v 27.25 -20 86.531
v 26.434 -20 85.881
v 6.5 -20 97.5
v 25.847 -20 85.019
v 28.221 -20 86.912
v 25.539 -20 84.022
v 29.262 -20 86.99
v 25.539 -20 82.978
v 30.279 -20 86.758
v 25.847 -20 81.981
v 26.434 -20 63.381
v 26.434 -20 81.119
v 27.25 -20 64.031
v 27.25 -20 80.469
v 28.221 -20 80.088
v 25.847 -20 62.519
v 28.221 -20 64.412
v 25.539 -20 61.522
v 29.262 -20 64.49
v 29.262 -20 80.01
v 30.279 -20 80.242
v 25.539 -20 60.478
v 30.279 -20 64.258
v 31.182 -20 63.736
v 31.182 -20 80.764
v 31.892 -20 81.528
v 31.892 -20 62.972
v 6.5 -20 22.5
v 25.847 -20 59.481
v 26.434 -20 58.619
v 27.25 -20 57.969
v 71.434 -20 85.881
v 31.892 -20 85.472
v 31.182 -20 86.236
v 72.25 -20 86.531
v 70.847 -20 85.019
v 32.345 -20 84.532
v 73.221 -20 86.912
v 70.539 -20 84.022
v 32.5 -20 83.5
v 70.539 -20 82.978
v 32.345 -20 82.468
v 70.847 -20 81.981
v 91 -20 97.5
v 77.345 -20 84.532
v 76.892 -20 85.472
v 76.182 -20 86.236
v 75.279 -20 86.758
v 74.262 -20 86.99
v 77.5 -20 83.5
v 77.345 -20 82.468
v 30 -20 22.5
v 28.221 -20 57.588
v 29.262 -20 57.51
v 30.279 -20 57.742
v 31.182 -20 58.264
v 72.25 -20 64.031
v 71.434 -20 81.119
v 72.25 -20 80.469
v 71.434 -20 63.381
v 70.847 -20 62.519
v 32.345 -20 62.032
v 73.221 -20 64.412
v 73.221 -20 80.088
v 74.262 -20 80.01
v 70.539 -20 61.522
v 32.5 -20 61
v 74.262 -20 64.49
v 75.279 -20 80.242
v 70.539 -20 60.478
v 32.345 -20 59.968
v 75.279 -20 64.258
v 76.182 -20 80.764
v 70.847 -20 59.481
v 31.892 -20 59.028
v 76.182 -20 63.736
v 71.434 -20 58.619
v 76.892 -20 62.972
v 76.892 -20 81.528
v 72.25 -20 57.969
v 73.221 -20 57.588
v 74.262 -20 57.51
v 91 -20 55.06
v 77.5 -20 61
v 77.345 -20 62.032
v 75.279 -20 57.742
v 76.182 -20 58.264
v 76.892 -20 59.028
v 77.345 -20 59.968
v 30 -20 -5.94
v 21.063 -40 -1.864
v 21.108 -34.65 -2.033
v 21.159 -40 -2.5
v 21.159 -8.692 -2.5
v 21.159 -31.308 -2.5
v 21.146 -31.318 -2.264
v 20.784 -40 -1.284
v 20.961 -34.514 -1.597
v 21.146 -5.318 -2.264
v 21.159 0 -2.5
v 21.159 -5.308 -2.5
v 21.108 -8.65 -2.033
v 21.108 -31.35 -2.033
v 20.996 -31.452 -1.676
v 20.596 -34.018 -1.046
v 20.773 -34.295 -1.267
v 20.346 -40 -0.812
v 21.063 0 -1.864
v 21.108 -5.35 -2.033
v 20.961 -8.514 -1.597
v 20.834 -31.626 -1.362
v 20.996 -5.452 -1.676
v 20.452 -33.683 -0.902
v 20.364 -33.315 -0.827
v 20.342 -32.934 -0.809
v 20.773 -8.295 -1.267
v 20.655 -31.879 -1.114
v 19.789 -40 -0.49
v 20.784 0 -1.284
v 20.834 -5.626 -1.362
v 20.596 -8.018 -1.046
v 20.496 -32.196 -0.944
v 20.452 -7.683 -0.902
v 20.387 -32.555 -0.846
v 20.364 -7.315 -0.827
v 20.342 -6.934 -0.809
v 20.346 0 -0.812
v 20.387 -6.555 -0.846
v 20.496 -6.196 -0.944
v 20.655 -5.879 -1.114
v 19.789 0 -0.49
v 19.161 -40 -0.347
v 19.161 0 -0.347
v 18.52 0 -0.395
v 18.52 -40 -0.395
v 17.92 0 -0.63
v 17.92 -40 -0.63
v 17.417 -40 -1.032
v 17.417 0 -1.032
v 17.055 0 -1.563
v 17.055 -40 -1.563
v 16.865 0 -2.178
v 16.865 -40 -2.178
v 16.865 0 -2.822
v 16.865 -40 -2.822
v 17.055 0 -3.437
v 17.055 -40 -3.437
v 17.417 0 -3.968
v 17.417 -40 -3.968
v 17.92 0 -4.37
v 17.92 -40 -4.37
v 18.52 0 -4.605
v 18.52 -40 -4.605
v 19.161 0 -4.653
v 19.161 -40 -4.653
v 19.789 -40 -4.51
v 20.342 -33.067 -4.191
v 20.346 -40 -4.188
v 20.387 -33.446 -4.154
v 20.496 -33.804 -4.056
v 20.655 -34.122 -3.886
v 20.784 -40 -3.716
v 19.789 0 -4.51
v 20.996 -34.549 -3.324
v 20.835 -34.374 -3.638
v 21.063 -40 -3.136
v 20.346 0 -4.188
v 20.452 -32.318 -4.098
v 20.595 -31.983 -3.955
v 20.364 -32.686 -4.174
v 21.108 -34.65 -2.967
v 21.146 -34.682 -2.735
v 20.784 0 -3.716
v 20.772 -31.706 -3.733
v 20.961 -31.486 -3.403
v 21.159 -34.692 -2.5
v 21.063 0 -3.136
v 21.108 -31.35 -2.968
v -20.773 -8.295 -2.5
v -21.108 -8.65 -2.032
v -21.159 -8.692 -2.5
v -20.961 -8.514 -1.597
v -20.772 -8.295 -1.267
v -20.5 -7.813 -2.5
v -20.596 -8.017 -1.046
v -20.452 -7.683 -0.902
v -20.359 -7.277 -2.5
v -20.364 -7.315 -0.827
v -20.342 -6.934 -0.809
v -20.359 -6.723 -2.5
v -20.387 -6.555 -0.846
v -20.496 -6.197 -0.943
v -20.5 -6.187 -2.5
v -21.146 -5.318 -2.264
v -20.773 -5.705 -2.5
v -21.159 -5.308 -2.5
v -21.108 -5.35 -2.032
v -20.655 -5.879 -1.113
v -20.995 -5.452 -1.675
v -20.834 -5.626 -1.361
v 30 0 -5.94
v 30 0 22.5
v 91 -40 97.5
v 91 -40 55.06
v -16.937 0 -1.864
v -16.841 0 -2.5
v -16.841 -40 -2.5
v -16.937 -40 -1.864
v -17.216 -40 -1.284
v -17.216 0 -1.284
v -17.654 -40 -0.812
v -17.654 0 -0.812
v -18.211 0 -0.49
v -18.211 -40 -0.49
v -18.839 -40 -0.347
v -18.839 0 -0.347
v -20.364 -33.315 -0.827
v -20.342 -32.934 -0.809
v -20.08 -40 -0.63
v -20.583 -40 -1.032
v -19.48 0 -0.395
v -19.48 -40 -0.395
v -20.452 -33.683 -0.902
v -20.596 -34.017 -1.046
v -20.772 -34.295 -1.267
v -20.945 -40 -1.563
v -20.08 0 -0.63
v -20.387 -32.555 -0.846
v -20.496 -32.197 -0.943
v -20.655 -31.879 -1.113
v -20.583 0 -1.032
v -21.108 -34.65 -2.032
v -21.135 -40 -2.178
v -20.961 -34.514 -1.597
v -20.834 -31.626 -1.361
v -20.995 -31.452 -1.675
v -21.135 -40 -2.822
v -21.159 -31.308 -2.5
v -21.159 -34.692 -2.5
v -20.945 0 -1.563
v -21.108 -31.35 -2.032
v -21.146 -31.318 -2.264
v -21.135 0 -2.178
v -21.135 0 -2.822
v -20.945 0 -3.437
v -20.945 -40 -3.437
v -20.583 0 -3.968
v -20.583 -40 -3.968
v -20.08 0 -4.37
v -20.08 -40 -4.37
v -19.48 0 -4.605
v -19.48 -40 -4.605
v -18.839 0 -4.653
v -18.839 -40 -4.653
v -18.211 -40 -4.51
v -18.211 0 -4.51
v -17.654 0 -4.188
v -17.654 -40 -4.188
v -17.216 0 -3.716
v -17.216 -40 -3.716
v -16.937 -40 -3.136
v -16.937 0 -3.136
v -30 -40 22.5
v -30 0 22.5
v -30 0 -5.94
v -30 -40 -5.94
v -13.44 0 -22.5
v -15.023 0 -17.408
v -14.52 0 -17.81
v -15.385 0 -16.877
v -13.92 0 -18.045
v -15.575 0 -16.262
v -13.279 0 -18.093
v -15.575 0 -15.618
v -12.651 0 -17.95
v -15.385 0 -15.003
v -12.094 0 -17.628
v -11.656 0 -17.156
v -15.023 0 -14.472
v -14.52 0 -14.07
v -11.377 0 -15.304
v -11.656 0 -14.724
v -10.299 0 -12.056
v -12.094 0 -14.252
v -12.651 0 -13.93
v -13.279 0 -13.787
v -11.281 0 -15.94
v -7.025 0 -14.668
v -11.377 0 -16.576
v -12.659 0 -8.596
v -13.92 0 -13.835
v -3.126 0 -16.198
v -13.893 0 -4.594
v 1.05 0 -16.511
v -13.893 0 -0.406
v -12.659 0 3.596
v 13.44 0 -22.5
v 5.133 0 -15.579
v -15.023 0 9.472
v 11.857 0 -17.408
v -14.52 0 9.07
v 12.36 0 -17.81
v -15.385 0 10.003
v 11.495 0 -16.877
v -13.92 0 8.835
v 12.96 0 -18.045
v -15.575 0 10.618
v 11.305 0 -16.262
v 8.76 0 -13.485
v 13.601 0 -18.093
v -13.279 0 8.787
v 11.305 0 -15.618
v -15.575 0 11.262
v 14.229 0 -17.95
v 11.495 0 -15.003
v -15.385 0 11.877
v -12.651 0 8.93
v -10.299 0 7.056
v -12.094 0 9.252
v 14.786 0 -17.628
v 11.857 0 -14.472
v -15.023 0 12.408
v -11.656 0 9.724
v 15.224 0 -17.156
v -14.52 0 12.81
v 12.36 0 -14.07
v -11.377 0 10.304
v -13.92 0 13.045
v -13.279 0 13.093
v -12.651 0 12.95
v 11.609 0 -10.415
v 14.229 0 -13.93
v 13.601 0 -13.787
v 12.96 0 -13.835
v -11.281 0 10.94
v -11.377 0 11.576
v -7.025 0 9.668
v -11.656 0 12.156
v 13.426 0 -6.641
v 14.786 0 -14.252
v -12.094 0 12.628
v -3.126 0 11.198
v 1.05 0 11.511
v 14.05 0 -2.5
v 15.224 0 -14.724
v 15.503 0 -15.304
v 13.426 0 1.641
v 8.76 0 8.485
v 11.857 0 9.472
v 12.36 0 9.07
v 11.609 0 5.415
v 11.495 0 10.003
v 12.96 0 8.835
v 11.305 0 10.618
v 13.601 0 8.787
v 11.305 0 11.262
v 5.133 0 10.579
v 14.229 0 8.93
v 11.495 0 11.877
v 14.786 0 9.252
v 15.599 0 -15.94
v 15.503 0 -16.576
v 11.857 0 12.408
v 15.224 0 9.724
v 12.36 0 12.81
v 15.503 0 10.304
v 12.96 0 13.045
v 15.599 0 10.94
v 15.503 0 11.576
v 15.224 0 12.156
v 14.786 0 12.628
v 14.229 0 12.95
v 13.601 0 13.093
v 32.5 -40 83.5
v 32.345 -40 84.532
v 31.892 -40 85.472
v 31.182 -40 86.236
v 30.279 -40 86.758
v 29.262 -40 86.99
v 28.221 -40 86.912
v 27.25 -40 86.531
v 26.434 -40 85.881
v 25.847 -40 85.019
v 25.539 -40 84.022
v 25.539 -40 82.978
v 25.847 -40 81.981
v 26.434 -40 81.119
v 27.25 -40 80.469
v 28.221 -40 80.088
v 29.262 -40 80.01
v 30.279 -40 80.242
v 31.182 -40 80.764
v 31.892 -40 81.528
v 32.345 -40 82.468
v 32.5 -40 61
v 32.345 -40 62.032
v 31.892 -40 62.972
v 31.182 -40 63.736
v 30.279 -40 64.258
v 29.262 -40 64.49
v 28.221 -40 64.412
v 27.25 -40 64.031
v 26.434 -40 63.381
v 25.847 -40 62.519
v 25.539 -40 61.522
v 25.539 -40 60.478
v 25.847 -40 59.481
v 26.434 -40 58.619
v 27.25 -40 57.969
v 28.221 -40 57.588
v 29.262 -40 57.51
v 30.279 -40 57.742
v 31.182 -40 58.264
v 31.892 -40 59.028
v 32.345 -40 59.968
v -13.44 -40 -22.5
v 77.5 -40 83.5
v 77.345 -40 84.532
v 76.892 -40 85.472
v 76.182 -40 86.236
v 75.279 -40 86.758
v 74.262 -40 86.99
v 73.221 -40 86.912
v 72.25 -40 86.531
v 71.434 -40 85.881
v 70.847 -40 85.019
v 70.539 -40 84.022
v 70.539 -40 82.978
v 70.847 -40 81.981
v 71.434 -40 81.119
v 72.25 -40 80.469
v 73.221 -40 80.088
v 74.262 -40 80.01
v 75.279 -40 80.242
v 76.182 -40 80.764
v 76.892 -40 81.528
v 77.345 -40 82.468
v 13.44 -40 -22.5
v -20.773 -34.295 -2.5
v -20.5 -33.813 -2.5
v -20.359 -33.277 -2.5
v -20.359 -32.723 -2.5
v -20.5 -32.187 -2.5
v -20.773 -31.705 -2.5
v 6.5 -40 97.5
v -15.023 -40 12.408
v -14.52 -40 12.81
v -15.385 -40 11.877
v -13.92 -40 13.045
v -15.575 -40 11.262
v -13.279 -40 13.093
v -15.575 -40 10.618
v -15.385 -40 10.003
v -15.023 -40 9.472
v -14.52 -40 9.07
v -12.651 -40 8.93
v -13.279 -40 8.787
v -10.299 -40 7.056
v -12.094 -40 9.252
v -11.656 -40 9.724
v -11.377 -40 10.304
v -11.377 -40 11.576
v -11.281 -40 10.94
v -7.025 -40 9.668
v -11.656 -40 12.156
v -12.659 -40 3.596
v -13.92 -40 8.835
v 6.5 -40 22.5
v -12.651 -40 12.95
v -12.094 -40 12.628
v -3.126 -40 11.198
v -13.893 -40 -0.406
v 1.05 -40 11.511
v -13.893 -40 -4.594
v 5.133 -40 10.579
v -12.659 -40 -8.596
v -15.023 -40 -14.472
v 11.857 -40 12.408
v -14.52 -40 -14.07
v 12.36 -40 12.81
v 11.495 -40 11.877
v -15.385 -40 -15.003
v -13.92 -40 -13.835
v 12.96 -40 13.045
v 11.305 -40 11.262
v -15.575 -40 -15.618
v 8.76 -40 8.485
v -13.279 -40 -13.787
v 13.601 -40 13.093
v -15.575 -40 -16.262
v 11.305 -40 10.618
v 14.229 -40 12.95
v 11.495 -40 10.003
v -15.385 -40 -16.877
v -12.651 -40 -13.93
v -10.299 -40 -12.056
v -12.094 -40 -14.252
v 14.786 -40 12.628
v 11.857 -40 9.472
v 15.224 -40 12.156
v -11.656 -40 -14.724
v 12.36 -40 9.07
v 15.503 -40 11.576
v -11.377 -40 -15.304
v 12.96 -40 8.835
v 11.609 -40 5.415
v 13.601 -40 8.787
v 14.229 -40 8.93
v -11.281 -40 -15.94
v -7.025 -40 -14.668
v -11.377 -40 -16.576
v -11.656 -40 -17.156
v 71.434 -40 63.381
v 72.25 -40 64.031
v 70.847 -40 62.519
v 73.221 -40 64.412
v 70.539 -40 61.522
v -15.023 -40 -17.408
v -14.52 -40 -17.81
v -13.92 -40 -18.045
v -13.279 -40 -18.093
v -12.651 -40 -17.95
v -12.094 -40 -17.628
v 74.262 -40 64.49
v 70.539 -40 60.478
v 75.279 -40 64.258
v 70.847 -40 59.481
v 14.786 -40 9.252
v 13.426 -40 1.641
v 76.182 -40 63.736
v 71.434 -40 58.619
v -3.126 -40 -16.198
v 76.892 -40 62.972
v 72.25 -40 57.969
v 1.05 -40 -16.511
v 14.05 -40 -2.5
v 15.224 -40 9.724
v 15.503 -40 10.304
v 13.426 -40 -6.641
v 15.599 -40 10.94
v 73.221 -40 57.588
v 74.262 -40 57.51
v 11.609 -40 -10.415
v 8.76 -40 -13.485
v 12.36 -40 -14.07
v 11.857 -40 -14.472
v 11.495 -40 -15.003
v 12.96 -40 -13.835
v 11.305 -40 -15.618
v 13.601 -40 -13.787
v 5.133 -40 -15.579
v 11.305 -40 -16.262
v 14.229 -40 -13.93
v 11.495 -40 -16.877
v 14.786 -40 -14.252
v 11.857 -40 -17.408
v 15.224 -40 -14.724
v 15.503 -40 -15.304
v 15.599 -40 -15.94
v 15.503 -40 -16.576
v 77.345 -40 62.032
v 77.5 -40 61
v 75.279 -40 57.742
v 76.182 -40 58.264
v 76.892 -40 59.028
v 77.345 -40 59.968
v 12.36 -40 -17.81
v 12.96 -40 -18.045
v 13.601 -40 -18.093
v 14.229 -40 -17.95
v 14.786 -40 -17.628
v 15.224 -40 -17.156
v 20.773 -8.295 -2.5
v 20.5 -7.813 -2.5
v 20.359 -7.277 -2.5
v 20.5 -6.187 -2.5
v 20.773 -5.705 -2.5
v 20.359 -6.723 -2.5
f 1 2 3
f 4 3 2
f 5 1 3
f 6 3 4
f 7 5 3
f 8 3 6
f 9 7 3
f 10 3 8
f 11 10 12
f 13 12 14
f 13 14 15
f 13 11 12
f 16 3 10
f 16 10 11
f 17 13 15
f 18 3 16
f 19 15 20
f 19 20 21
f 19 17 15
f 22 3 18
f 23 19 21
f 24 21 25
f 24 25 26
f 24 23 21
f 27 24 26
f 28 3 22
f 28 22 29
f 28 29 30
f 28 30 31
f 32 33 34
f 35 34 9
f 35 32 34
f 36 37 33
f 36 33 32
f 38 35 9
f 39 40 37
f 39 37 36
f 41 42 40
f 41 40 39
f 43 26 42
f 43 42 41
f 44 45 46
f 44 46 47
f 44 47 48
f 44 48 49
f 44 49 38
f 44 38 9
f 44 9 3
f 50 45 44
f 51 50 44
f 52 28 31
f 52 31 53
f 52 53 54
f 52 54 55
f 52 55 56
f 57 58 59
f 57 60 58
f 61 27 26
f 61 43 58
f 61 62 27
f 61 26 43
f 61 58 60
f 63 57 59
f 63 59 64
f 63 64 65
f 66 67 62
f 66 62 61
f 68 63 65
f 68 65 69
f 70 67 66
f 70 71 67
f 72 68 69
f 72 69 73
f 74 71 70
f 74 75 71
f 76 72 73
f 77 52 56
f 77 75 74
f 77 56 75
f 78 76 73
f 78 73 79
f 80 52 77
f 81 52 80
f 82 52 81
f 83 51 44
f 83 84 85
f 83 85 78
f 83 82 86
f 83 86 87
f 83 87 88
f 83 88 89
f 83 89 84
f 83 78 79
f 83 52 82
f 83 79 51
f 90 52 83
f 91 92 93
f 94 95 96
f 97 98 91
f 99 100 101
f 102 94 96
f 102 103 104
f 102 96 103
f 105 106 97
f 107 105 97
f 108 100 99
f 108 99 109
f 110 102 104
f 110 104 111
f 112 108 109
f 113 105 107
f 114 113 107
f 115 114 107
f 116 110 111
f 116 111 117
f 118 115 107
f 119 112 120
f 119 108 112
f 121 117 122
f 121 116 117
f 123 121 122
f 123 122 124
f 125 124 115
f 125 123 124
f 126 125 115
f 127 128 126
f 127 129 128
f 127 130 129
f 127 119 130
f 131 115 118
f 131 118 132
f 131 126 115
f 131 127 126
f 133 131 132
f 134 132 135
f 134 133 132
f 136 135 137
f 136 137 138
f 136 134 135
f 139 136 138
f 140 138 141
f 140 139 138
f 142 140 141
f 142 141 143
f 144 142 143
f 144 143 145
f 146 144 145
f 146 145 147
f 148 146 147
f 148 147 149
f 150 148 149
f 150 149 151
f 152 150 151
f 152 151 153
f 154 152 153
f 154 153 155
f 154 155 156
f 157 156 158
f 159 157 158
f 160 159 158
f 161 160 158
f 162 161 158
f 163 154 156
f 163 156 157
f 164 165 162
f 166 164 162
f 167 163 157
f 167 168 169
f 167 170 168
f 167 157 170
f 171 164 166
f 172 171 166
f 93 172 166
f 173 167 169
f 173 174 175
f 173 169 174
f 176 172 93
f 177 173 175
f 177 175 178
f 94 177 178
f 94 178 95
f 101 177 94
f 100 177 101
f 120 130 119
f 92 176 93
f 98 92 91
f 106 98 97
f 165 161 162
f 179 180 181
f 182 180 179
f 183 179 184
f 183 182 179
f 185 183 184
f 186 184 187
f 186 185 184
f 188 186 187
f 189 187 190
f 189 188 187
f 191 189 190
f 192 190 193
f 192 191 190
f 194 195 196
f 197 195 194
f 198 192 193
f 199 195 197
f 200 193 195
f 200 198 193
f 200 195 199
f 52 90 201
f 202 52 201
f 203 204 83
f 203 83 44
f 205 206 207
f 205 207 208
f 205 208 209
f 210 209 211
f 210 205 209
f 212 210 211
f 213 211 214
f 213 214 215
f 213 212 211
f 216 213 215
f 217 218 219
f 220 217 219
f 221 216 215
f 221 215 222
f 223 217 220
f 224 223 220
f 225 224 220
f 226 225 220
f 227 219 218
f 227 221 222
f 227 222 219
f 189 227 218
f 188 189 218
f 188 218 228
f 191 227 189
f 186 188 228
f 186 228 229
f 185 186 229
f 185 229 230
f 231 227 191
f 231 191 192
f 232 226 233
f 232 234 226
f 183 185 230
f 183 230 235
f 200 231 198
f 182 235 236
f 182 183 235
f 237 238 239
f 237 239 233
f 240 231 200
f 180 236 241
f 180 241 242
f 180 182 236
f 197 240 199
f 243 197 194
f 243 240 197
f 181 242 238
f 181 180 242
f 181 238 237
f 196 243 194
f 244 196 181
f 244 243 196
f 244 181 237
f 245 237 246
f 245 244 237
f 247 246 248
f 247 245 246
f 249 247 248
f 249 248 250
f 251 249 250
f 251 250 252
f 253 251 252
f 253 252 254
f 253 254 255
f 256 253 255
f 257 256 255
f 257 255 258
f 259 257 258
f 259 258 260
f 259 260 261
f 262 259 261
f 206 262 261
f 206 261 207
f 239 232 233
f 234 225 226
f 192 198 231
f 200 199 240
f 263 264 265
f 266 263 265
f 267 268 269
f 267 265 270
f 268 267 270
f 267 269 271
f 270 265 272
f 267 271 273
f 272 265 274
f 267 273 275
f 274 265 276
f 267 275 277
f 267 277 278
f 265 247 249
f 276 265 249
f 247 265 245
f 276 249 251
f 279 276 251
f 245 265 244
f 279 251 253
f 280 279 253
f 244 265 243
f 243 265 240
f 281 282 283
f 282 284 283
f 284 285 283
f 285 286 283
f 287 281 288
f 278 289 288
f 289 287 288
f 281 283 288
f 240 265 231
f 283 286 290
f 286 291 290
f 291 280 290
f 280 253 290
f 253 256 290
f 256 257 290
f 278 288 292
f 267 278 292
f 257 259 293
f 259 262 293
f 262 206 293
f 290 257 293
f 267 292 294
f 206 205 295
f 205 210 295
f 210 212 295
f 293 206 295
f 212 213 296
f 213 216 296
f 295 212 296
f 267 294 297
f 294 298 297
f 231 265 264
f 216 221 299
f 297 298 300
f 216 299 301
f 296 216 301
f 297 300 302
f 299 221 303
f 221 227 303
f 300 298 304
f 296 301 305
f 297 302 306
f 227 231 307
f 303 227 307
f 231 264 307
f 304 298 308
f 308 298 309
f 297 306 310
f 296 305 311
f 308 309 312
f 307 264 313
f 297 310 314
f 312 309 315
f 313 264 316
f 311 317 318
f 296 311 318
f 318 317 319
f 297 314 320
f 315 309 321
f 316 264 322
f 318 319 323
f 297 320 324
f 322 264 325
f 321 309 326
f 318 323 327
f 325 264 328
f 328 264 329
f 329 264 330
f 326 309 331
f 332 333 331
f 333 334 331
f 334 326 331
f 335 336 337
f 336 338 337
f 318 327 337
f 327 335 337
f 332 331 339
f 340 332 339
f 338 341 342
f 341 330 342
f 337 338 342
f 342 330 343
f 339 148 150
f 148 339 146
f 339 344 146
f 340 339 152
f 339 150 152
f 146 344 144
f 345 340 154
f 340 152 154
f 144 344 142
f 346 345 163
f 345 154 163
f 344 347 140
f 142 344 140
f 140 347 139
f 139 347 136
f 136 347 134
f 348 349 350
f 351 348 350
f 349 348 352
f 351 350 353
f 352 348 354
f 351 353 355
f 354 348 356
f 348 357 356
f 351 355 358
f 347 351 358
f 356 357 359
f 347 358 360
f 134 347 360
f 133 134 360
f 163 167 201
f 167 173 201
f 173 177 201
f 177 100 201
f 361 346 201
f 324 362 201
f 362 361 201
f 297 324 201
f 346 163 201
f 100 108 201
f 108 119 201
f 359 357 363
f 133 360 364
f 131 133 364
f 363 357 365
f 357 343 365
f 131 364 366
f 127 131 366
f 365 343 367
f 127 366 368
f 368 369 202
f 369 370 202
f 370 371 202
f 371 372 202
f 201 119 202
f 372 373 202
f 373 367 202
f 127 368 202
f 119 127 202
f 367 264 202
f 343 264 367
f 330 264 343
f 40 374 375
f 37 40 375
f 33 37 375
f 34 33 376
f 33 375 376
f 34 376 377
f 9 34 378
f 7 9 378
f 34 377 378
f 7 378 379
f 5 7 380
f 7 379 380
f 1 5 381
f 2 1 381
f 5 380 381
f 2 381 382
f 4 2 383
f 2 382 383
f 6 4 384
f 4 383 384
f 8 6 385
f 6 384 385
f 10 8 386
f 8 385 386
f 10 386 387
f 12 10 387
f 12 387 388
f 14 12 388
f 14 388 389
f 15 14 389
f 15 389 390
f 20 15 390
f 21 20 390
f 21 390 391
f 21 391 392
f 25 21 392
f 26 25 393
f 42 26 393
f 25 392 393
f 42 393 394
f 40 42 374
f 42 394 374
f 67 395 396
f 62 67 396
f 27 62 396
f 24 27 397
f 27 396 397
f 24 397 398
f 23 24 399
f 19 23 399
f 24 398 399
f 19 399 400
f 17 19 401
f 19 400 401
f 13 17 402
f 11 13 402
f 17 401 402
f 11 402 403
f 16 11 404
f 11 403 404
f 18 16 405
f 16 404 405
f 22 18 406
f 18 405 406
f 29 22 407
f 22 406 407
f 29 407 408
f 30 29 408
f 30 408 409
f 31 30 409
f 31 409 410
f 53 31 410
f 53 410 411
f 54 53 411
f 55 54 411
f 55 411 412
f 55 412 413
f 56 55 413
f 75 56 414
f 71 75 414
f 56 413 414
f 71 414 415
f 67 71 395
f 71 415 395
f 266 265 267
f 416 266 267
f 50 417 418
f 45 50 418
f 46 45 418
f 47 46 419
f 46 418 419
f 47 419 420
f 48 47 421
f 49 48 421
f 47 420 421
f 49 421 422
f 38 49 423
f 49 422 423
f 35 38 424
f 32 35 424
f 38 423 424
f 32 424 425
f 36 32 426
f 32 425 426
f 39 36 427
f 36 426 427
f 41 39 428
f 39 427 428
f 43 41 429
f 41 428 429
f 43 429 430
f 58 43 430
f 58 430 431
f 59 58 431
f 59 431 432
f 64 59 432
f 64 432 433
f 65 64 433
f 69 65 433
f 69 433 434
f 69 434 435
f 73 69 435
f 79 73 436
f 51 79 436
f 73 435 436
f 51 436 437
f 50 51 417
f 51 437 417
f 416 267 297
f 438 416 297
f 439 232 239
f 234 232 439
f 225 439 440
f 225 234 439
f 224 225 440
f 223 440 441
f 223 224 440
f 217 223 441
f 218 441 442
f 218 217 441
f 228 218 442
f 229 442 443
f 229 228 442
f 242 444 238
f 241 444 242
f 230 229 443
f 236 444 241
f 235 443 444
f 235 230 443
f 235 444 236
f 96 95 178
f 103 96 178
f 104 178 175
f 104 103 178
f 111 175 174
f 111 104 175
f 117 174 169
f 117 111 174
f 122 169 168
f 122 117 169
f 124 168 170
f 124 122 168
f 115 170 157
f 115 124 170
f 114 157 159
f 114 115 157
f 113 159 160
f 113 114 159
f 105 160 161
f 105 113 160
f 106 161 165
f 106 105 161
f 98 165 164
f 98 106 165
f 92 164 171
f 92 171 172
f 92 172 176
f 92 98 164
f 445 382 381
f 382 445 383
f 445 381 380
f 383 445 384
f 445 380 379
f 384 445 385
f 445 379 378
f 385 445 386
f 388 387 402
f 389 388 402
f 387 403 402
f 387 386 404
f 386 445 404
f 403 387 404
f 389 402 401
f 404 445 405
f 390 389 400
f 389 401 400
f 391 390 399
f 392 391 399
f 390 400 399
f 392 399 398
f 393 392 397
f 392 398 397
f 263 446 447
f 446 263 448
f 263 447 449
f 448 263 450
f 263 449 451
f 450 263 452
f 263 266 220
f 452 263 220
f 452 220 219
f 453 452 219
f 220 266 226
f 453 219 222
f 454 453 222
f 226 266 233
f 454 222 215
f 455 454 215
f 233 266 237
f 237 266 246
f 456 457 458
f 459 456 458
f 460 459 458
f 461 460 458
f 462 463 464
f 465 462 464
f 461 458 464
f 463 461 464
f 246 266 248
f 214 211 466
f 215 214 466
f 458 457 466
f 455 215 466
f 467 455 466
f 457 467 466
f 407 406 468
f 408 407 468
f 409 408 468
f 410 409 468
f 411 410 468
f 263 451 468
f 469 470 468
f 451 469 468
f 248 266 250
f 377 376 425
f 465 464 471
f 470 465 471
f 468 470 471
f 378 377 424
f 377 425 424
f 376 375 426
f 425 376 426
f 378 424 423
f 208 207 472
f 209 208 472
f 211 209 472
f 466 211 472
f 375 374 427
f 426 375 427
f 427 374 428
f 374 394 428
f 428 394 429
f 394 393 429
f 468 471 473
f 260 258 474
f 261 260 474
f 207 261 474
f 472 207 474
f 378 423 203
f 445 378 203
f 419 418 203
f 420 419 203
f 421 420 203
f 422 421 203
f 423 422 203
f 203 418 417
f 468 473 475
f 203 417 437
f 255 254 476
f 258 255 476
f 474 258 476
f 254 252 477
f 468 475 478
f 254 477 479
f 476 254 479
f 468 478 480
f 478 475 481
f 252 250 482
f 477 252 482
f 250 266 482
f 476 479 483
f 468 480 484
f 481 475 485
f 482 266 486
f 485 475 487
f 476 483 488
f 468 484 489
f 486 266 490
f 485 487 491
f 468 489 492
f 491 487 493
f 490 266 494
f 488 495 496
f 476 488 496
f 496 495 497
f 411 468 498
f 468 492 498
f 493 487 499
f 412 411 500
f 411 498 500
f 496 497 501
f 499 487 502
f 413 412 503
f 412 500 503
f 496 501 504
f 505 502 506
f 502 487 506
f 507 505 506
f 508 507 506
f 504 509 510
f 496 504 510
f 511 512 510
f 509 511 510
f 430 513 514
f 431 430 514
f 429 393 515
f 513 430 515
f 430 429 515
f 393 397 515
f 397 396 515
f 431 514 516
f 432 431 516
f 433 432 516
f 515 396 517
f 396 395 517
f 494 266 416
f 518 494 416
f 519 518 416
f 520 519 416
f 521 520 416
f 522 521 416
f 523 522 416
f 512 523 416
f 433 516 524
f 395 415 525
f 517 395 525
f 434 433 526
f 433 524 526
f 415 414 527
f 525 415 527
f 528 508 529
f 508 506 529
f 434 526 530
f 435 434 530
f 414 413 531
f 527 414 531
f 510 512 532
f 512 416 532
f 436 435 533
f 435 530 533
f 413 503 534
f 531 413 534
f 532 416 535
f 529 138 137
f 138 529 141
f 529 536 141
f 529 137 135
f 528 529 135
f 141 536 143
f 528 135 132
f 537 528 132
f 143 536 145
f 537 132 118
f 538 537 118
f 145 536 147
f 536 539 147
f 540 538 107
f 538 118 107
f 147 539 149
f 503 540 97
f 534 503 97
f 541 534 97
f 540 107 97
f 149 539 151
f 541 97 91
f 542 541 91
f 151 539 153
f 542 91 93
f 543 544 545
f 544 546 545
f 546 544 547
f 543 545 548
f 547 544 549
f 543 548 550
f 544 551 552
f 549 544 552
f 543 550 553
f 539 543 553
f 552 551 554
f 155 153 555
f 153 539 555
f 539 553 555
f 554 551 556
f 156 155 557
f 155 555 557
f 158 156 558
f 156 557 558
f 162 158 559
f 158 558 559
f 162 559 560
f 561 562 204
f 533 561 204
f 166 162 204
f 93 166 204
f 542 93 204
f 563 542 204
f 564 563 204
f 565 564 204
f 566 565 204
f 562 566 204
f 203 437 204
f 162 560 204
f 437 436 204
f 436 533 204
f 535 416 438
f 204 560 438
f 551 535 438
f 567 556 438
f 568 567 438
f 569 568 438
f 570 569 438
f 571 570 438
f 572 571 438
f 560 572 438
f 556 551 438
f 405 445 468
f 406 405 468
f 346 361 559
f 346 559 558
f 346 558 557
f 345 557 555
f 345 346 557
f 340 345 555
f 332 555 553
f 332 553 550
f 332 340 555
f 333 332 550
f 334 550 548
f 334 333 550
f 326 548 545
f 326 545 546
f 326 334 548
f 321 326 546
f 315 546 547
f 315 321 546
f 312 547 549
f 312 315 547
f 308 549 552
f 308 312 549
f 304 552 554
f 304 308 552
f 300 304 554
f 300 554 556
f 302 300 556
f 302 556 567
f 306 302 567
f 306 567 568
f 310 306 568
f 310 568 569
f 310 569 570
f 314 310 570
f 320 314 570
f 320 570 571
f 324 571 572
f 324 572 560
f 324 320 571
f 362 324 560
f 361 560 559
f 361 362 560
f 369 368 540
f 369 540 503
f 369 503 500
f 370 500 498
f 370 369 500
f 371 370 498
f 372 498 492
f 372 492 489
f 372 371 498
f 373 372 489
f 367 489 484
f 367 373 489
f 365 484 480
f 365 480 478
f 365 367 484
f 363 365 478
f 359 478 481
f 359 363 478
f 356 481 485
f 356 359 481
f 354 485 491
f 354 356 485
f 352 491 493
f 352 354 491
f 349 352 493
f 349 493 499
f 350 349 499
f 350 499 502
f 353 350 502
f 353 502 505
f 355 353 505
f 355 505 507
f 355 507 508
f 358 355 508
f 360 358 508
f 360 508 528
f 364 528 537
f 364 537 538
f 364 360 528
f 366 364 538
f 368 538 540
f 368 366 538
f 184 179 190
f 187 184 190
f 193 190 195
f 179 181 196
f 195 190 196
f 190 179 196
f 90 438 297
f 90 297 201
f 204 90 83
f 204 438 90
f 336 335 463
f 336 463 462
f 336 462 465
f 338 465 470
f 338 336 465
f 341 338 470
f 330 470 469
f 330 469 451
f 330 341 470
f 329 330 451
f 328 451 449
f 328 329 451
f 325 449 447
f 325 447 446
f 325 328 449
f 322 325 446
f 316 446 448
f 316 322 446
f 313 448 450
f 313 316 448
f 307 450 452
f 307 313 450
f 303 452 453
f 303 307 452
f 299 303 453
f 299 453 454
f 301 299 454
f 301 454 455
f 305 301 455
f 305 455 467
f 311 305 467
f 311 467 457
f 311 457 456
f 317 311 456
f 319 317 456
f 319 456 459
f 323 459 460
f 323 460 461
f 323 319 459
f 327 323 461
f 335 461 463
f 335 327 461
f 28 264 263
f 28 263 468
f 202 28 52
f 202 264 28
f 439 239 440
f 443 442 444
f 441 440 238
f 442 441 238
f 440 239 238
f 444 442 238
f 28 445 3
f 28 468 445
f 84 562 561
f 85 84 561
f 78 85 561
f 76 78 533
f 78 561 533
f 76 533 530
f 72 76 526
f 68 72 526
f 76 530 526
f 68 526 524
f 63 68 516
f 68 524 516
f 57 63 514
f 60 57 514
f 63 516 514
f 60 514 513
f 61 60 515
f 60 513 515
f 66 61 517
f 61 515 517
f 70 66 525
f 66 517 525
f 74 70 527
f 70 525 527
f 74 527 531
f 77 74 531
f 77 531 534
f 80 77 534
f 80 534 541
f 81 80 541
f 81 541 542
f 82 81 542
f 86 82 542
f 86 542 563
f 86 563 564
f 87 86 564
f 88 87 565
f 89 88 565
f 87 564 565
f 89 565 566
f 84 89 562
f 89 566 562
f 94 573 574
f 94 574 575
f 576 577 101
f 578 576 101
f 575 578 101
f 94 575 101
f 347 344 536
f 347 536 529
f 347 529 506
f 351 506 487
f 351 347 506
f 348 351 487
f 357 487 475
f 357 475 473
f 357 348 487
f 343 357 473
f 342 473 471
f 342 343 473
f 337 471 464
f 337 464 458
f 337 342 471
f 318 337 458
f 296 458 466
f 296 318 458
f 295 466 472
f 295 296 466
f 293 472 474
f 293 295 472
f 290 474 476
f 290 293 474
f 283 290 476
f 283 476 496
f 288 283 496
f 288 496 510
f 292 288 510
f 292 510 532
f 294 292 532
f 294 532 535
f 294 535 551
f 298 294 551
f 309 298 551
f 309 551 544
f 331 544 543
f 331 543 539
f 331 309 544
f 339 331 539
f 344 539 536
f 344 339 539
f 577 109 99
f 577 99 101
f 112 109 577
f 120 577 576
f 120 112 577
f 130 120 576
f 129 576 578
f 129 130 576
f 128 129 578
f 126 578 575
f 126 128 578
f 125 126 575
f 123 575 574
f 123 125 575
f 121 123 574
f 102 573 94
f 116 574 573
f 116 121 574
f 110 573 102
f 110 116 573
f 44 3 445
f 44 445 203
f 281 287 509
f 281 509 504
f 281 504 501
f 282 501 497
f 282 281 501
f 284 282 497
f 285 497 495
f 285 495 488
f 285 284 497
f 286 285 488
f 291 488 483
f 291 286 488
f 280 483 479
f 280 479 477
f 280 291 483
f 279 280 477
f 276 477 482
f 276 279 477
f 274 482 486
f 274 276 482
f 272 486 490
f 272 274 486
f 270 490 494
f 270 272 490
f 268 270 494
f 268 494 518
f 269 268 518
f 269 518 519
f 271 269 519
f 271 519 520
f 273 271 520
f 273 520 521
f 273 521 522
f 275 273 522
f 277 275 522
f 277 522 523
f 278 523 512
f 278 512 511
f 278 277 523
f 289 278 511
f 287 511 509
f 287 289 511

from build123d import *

# Parameters (mm, degrees)
F0_R      = 2.159
F0_R_2    = 14.05
F1_DEPTH  = 40
F2_R      = 2.159
F3_DEPTH  = 15
F5_DEPTH  = 25
F6_R      = 2.159
F7_DEPTH  = 25
F4_W      = 19
F4_H      = 20
F4_R      = 2.159
F8_DEPTH  = 25
F9_R      = 2.159
F10_DEPTH = 57.1
F11_R     = 3.5
F12_DEPTH = 20
F9_W      = 4.5
F9_H      = 20
F13_DEPTH = 25
F14_DEPTH = 50


# Not quite as in the source:
# - an extrude ends at something that could not be found from the text; its depth is read off the source's solid


with BuildPart() as f1:
    # F0 (on Front) → F1 (new body)
    with BuildSketch(Plane.XZ):
        Polygon((30, -5.94), (30, 22.5), (-30, 22.5), (-30, -5.94), (-13.44, -22.5), (13.44, -22.5), align=None)
        with Locations((-13.44, -15.94)):
            Circle(F0_R, mode=Mode.SUBTRACT)
        with Locations((-19, -2.5)):
            Circle(F0_R, mode=Mode.SUBTRACT)
        with Locations((13.44, -15.94)):
            Circle(F0_R, mode=Mode.SUBTRACT)
        with Locations((0, -2.5)):
            Circle(F0_R_2, mode=Mode.SUBTRACT)
        with Locations((19, -2.5)):
            Circle(F0_R, mode=Mode.SUBTRACT)
        with Locations((-13.44, 10.94)):
            Circle(F0_R, mode=Mode.SUBTRACT)
        with Locations((13.44, 10.94)):
            Circle(F0_R, mode=Mode.SUBTRACT)
    extrude(amount=F1_DEPTH)

    # F2 (on face) → F3 (cut)
    with BuildSketch(Plane.XY.offset(22.5)):
        with Locations((-22.5, -7)):
            Circle(F2_R)
        with Locations((22.5, -7)):
            Circle(F2_R)
        with Locations((-22.5, -33)):
            Circle(F2_R)
        with Locations((22.5, -33)):
            Circle(F2_R)
    extrude(amount=-F3_DEPTH, mode=Mode.SUBTRACT)

    # F2 (on face) → F5 (join)
    with BuildSketch(Plane.XY.offset(22.5)):
        with Locations((22.5, -33)):
            Circle(F2_R)
    extrude(amount=-F5_DEPTH)

    # F6 (on face) → F7 (join)
    with BuildSketch(Plane.XY.offset(22.5)):
        with Locations((22.5, -7)):
            Circle(F6_R)
        with Locations((22.5, -33)):
            Circle(F6_R)
        with Locations((-22.5, -7)):
            Circle(F6_R)
        with Locations((-22.5, -33)):
            Circle(F6_R)
    extrude(amount=-F7_DEPTH)

    # F4 (on face) → F8 (join)
    with BuildSketch(Plane.XY.offset(22.5)):
        with Locations((20.5, -30)):
            Rectangle(F4_W, F4_H)
        with Locations((22.5, -33)):
            Circle(F4_R, mode=Mode.SUBTRACT)
    extrude(amount=F8_DEPTH)

    # F9 (on face) → F10 (join)
    with BuildSketch(Plane.XY.offset(47.5)):
        with Locations((22.5, -33)):
            Circle(F9_R)
    extrude(amount=-F10_DEPTH)

    # F11 (on face) → F12 (join, through all)
    with BuildSketch(Plane.XZ.offset(40)):
        Polygon((11, 83.5), (11, 47.5), (30, 47.5), (30, -5.94), (91, 55.06), (91, 97.5), (11, 97.5), align=None)
        with Locations((29, 61)):
            Circle(F11_R, mode=Mode.SUBTRACT)
        with Locations((29, 83.5)):
            Circle(F11_R, mode=Mode.SUBTRACT)
        with Locations((74, 61)):
            Circle(F11_R, mode=Mode.SUBTRACT)
        with Locations((74, 83.5)):
            Circle(F11_R, mode=Mode.SUBTRACT)
    extrude(amount=-F12_DEPTH)

    # F9 (on face) → F13 (join)
    with BuildSketch(Plane.XY.offset(47.5)):
        with Locations((8.75, -30)):
            Rectangle(F9_W, F9_H)
    extrude(amount=-F13_DEPTH)

    # F9 (on face) → F14 (join, through all)
    with BuildSketch(Plane.XY.offset(47.5)):
        with Locations((8.75, -30)):
            Rectangle(F9_W, F9_H)
    extrude(amount=F14_DEPTH)


solid = f1.part
